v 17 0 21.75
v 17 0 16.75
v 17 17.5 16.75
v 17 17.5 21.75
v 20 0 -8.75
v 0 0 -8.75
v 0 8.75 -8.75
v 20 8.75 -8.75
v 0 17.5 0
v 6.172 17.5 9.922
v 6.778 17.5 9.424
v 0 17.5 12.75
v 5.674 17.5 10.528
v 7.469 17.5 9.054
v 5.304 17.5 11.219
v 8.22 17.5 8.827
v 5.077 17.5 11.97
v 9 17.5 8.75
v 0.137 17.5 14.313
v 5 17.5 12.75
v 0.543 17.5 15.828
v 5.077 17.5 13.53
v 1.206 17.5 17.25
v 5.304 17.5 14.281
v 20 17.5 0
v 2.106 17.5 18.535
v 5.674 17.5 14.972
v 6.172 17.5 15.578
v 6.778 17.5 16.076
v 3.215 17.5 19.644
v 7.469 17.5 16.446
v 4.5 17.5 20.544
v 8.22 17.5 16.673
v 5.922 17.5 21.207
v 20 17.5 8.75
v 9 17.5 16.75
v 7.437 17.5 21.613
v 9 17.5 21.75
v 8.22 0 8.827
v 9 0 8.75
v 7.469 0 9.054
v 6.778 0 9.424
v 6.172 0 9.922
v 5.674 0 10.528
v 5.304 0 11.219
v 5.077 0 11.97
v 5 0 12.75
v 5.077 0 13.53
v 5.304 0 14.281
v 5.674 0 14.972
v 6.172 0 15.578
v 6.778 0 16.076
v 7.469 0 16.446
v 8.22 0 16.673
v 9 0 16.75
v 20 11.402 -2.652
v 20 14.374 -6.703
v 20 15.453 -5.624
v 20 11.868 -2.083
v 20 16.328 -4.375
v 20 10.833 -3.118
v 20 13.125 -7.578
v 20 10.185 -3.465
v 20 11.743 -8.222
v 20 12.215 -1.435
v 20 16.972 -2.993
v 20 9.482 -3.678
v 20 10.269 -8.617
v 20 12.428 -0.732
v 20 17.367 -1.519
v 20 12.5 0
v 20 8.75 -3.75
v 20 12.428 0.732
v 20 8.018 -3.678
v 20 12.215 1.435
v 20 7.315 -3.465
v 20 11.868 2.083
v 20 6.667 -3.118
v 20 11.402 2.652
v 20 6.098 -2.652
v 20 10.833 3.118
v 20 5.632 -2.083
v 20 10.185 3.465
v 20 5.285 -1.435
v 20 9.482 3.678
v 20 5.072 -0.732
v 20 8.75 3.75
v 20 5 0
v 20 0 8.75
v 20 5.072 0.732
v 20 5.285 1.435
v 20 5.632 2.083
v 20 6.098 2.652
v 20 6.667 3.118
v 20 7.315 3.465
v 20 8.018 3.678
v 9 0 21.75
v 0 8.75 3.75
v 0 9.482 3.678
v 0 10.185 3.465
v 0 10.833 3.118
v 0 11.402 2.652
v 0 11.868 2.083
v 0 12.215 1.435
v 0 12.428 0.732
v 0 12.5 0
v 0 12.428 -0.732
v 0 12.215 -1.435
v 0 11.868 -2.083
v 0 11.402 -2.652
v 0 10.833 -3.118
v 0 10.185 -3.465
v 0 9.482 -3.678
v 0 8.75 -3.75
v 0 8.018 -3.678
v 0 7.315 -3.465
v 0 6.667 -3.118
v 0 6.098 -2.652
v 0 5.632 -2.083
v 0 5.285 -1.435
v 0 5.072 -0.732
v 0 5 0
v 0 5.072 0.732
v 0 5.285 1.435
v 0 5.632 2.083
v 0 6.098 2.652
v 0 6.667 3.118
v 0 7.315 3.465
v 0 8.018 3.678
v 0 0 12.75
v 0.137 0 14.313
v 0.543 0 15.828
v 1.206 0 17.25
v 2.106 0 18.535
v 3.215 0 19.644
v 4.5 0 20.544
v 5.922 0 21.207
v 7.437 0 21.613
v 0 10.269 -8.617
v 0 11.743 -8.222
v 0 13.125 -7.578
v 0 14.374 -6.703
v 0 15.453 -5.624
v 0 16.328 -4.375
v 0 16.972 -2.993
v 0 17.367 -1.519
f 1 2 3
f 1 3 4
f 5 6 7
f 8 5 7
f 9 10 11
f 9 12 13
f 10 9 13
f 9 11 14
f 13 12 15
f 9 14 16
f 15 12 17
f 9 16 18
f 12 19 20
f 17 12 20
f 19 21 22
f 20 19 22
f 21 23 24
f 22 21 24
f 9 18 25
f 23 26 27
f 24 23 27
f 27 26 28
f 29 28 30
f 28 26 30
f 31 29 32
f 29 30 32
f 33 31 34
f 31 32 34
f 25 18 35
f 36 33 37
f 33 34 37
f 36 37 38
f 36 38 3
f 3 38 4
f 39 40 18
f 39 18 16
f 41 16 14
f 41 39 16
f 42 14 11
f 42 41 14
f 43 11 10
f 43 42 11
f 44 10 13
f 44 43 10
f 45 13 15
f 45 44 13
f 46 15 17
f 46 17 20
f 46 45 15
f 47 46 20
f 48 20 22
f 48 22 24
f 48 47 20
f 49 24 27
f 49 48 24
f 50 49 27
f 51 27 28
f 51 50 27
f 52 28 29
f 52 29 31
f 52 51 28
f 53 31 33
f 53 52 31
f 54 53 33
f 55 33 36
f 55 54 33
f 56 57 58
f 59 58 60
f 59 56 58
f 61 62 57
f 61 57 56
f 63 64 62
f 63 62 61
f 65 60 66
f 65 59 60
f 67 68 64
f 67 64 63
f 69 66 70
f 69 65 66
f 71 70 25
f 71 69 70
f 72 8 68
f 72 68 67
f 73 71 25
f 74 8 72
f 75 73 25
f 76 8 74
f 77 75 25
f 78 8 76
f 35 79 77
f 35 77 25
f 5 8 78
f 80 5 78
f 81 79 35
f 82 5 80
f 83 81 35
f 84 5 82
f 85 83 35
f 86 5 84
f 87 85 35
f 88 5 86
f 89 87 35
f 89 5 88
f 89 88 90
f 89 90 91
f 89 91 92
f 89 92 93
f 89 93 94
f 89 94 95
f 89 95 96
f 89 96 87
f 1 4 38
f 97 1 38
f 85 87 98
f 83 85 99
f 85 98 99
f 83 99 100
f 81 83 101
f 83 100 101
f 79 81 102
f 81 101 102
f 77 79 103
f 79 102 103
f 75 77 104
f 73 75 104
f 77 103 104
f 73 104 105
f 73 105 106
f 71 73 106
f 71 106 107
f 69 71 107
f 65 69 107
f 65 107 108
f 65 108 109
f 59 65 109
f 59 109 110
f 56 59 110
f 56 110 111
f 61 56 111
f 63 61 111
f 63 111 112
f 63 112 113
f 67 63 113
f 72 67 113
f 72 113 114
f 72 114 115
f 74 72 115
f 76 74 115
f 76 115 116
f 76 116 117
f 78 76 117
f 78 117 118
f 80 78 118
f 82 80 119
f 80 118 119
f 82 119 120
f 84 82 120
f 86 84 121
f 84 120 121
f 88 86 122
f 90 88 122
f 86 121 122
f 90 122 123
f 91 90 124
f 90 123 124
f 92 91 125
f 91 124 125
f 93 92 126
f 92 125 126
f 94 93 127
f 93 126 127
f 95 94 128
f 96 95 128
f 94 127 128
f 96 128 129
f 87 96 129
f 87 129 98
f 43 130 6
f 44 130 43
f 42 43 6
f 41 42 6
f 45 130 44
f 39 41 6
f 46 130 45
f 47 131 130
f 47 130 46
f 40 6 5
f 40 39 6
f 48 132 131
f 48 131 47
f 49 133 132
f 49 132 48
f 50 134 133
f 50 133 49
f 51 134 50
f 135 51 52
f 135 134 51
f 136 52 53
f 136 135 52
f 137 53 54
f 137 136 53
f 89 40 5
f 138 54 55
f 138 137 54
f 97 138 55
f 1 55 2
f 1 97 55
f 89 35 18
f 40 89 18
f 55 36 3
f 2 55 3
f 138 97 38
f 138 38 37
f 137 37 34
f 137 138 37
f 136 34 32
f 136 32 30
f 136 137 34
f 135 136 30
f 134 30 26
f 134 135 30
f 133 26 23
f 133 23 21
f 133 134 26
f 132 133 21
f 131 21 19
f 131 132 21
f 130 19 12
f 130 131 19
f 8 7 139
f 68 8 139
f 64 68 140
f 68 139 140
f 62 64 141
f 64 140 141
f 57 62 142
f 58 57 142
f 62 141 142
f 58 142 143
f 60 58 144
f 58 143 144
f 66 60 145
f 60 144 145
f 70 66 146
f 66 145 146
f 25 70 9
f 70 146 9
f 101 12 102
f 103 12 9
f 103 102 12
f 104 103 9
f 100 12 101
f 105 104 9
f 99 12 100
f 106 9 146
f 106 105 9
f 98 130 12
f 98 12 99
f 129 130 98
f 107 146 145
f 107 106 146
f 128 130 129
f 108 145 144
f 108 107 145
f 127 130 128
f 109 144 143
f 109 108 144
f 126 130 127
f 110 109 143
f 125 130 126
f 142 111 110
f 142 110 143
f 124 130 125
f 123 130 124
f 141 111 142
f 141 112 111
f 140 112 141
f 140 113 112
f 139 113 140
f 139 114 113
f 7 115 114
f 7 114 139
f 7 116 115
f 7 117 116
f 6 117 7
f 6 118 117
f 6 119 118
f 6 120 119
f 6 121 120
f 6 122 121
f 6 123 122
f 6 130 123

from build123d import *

# Parameters (mm, degrees)
BOSS_EXTRUDE1_DEPTH = 20
BOSS_EXTRUDE2_DEPTH = 17.5
SKETCH3_R           = 3.75
CUT_EXTRUDE1_DEPTH  = 21


with BuildPart() as part:
    # Sketch1 → Boss-Extrude1 (new body)
    with BuildSketch(Plane(origin=(0, 0, 0), x_dir=(0, 0, -1), z_dir=(1, 0, 0))):
        with BuildLine():
            Line((-8.75, 0), (8.75, 0))
            Line((8.75, 0), (8.75, 8.75))
            ThreePointArc((8.75, 8.75), (0, 17.5), (-8.75, 8.75))
            Line((-8.75, 8.75), (-8.75, 0))
        make_face()
    extrude(amount=BOSS_EXTRUDE1_DEPTH)

    # Sketch2 → Boss-Extrude2 (add)
    with BuildSketch(Plane.XZ):
        with BuildLine():
            Line((0, 12.75), (0, 8.75))
            Line((0, 8.75), (0, 0))
            Line((0, 0), (20, 0))
            Line((20, 0), (20, 8.75))
            Line((20, 8.75), (9, 8.75))
            ThreePointArc((9, 8.75), (5, 12.75), (9, 16.75))
            Line((9, 16.75), (17, 16.75))
            Line((17, 16.75), (17, 21.75))
            Line((17, 21.75), (9, 21.75))
            ThreePointArc((9, 21.75), (2.636038969, 19.113961031), (0, 12.75))
        make_face()
    extrude(amount=-BOSS_EXTRUDE2_DEPTH)

    # Sketch3 → Cut-Extrude1 (cut, through all)
    with BuildSketch(Plane.ZY):
        with Locations((0, 8.75)):
            Circle(SKETCH3_R)
    extrude(amount=-CUT_EXTRUDE1_DEPTH, mode=Mode.SUBTRACT)


solid = part.part
